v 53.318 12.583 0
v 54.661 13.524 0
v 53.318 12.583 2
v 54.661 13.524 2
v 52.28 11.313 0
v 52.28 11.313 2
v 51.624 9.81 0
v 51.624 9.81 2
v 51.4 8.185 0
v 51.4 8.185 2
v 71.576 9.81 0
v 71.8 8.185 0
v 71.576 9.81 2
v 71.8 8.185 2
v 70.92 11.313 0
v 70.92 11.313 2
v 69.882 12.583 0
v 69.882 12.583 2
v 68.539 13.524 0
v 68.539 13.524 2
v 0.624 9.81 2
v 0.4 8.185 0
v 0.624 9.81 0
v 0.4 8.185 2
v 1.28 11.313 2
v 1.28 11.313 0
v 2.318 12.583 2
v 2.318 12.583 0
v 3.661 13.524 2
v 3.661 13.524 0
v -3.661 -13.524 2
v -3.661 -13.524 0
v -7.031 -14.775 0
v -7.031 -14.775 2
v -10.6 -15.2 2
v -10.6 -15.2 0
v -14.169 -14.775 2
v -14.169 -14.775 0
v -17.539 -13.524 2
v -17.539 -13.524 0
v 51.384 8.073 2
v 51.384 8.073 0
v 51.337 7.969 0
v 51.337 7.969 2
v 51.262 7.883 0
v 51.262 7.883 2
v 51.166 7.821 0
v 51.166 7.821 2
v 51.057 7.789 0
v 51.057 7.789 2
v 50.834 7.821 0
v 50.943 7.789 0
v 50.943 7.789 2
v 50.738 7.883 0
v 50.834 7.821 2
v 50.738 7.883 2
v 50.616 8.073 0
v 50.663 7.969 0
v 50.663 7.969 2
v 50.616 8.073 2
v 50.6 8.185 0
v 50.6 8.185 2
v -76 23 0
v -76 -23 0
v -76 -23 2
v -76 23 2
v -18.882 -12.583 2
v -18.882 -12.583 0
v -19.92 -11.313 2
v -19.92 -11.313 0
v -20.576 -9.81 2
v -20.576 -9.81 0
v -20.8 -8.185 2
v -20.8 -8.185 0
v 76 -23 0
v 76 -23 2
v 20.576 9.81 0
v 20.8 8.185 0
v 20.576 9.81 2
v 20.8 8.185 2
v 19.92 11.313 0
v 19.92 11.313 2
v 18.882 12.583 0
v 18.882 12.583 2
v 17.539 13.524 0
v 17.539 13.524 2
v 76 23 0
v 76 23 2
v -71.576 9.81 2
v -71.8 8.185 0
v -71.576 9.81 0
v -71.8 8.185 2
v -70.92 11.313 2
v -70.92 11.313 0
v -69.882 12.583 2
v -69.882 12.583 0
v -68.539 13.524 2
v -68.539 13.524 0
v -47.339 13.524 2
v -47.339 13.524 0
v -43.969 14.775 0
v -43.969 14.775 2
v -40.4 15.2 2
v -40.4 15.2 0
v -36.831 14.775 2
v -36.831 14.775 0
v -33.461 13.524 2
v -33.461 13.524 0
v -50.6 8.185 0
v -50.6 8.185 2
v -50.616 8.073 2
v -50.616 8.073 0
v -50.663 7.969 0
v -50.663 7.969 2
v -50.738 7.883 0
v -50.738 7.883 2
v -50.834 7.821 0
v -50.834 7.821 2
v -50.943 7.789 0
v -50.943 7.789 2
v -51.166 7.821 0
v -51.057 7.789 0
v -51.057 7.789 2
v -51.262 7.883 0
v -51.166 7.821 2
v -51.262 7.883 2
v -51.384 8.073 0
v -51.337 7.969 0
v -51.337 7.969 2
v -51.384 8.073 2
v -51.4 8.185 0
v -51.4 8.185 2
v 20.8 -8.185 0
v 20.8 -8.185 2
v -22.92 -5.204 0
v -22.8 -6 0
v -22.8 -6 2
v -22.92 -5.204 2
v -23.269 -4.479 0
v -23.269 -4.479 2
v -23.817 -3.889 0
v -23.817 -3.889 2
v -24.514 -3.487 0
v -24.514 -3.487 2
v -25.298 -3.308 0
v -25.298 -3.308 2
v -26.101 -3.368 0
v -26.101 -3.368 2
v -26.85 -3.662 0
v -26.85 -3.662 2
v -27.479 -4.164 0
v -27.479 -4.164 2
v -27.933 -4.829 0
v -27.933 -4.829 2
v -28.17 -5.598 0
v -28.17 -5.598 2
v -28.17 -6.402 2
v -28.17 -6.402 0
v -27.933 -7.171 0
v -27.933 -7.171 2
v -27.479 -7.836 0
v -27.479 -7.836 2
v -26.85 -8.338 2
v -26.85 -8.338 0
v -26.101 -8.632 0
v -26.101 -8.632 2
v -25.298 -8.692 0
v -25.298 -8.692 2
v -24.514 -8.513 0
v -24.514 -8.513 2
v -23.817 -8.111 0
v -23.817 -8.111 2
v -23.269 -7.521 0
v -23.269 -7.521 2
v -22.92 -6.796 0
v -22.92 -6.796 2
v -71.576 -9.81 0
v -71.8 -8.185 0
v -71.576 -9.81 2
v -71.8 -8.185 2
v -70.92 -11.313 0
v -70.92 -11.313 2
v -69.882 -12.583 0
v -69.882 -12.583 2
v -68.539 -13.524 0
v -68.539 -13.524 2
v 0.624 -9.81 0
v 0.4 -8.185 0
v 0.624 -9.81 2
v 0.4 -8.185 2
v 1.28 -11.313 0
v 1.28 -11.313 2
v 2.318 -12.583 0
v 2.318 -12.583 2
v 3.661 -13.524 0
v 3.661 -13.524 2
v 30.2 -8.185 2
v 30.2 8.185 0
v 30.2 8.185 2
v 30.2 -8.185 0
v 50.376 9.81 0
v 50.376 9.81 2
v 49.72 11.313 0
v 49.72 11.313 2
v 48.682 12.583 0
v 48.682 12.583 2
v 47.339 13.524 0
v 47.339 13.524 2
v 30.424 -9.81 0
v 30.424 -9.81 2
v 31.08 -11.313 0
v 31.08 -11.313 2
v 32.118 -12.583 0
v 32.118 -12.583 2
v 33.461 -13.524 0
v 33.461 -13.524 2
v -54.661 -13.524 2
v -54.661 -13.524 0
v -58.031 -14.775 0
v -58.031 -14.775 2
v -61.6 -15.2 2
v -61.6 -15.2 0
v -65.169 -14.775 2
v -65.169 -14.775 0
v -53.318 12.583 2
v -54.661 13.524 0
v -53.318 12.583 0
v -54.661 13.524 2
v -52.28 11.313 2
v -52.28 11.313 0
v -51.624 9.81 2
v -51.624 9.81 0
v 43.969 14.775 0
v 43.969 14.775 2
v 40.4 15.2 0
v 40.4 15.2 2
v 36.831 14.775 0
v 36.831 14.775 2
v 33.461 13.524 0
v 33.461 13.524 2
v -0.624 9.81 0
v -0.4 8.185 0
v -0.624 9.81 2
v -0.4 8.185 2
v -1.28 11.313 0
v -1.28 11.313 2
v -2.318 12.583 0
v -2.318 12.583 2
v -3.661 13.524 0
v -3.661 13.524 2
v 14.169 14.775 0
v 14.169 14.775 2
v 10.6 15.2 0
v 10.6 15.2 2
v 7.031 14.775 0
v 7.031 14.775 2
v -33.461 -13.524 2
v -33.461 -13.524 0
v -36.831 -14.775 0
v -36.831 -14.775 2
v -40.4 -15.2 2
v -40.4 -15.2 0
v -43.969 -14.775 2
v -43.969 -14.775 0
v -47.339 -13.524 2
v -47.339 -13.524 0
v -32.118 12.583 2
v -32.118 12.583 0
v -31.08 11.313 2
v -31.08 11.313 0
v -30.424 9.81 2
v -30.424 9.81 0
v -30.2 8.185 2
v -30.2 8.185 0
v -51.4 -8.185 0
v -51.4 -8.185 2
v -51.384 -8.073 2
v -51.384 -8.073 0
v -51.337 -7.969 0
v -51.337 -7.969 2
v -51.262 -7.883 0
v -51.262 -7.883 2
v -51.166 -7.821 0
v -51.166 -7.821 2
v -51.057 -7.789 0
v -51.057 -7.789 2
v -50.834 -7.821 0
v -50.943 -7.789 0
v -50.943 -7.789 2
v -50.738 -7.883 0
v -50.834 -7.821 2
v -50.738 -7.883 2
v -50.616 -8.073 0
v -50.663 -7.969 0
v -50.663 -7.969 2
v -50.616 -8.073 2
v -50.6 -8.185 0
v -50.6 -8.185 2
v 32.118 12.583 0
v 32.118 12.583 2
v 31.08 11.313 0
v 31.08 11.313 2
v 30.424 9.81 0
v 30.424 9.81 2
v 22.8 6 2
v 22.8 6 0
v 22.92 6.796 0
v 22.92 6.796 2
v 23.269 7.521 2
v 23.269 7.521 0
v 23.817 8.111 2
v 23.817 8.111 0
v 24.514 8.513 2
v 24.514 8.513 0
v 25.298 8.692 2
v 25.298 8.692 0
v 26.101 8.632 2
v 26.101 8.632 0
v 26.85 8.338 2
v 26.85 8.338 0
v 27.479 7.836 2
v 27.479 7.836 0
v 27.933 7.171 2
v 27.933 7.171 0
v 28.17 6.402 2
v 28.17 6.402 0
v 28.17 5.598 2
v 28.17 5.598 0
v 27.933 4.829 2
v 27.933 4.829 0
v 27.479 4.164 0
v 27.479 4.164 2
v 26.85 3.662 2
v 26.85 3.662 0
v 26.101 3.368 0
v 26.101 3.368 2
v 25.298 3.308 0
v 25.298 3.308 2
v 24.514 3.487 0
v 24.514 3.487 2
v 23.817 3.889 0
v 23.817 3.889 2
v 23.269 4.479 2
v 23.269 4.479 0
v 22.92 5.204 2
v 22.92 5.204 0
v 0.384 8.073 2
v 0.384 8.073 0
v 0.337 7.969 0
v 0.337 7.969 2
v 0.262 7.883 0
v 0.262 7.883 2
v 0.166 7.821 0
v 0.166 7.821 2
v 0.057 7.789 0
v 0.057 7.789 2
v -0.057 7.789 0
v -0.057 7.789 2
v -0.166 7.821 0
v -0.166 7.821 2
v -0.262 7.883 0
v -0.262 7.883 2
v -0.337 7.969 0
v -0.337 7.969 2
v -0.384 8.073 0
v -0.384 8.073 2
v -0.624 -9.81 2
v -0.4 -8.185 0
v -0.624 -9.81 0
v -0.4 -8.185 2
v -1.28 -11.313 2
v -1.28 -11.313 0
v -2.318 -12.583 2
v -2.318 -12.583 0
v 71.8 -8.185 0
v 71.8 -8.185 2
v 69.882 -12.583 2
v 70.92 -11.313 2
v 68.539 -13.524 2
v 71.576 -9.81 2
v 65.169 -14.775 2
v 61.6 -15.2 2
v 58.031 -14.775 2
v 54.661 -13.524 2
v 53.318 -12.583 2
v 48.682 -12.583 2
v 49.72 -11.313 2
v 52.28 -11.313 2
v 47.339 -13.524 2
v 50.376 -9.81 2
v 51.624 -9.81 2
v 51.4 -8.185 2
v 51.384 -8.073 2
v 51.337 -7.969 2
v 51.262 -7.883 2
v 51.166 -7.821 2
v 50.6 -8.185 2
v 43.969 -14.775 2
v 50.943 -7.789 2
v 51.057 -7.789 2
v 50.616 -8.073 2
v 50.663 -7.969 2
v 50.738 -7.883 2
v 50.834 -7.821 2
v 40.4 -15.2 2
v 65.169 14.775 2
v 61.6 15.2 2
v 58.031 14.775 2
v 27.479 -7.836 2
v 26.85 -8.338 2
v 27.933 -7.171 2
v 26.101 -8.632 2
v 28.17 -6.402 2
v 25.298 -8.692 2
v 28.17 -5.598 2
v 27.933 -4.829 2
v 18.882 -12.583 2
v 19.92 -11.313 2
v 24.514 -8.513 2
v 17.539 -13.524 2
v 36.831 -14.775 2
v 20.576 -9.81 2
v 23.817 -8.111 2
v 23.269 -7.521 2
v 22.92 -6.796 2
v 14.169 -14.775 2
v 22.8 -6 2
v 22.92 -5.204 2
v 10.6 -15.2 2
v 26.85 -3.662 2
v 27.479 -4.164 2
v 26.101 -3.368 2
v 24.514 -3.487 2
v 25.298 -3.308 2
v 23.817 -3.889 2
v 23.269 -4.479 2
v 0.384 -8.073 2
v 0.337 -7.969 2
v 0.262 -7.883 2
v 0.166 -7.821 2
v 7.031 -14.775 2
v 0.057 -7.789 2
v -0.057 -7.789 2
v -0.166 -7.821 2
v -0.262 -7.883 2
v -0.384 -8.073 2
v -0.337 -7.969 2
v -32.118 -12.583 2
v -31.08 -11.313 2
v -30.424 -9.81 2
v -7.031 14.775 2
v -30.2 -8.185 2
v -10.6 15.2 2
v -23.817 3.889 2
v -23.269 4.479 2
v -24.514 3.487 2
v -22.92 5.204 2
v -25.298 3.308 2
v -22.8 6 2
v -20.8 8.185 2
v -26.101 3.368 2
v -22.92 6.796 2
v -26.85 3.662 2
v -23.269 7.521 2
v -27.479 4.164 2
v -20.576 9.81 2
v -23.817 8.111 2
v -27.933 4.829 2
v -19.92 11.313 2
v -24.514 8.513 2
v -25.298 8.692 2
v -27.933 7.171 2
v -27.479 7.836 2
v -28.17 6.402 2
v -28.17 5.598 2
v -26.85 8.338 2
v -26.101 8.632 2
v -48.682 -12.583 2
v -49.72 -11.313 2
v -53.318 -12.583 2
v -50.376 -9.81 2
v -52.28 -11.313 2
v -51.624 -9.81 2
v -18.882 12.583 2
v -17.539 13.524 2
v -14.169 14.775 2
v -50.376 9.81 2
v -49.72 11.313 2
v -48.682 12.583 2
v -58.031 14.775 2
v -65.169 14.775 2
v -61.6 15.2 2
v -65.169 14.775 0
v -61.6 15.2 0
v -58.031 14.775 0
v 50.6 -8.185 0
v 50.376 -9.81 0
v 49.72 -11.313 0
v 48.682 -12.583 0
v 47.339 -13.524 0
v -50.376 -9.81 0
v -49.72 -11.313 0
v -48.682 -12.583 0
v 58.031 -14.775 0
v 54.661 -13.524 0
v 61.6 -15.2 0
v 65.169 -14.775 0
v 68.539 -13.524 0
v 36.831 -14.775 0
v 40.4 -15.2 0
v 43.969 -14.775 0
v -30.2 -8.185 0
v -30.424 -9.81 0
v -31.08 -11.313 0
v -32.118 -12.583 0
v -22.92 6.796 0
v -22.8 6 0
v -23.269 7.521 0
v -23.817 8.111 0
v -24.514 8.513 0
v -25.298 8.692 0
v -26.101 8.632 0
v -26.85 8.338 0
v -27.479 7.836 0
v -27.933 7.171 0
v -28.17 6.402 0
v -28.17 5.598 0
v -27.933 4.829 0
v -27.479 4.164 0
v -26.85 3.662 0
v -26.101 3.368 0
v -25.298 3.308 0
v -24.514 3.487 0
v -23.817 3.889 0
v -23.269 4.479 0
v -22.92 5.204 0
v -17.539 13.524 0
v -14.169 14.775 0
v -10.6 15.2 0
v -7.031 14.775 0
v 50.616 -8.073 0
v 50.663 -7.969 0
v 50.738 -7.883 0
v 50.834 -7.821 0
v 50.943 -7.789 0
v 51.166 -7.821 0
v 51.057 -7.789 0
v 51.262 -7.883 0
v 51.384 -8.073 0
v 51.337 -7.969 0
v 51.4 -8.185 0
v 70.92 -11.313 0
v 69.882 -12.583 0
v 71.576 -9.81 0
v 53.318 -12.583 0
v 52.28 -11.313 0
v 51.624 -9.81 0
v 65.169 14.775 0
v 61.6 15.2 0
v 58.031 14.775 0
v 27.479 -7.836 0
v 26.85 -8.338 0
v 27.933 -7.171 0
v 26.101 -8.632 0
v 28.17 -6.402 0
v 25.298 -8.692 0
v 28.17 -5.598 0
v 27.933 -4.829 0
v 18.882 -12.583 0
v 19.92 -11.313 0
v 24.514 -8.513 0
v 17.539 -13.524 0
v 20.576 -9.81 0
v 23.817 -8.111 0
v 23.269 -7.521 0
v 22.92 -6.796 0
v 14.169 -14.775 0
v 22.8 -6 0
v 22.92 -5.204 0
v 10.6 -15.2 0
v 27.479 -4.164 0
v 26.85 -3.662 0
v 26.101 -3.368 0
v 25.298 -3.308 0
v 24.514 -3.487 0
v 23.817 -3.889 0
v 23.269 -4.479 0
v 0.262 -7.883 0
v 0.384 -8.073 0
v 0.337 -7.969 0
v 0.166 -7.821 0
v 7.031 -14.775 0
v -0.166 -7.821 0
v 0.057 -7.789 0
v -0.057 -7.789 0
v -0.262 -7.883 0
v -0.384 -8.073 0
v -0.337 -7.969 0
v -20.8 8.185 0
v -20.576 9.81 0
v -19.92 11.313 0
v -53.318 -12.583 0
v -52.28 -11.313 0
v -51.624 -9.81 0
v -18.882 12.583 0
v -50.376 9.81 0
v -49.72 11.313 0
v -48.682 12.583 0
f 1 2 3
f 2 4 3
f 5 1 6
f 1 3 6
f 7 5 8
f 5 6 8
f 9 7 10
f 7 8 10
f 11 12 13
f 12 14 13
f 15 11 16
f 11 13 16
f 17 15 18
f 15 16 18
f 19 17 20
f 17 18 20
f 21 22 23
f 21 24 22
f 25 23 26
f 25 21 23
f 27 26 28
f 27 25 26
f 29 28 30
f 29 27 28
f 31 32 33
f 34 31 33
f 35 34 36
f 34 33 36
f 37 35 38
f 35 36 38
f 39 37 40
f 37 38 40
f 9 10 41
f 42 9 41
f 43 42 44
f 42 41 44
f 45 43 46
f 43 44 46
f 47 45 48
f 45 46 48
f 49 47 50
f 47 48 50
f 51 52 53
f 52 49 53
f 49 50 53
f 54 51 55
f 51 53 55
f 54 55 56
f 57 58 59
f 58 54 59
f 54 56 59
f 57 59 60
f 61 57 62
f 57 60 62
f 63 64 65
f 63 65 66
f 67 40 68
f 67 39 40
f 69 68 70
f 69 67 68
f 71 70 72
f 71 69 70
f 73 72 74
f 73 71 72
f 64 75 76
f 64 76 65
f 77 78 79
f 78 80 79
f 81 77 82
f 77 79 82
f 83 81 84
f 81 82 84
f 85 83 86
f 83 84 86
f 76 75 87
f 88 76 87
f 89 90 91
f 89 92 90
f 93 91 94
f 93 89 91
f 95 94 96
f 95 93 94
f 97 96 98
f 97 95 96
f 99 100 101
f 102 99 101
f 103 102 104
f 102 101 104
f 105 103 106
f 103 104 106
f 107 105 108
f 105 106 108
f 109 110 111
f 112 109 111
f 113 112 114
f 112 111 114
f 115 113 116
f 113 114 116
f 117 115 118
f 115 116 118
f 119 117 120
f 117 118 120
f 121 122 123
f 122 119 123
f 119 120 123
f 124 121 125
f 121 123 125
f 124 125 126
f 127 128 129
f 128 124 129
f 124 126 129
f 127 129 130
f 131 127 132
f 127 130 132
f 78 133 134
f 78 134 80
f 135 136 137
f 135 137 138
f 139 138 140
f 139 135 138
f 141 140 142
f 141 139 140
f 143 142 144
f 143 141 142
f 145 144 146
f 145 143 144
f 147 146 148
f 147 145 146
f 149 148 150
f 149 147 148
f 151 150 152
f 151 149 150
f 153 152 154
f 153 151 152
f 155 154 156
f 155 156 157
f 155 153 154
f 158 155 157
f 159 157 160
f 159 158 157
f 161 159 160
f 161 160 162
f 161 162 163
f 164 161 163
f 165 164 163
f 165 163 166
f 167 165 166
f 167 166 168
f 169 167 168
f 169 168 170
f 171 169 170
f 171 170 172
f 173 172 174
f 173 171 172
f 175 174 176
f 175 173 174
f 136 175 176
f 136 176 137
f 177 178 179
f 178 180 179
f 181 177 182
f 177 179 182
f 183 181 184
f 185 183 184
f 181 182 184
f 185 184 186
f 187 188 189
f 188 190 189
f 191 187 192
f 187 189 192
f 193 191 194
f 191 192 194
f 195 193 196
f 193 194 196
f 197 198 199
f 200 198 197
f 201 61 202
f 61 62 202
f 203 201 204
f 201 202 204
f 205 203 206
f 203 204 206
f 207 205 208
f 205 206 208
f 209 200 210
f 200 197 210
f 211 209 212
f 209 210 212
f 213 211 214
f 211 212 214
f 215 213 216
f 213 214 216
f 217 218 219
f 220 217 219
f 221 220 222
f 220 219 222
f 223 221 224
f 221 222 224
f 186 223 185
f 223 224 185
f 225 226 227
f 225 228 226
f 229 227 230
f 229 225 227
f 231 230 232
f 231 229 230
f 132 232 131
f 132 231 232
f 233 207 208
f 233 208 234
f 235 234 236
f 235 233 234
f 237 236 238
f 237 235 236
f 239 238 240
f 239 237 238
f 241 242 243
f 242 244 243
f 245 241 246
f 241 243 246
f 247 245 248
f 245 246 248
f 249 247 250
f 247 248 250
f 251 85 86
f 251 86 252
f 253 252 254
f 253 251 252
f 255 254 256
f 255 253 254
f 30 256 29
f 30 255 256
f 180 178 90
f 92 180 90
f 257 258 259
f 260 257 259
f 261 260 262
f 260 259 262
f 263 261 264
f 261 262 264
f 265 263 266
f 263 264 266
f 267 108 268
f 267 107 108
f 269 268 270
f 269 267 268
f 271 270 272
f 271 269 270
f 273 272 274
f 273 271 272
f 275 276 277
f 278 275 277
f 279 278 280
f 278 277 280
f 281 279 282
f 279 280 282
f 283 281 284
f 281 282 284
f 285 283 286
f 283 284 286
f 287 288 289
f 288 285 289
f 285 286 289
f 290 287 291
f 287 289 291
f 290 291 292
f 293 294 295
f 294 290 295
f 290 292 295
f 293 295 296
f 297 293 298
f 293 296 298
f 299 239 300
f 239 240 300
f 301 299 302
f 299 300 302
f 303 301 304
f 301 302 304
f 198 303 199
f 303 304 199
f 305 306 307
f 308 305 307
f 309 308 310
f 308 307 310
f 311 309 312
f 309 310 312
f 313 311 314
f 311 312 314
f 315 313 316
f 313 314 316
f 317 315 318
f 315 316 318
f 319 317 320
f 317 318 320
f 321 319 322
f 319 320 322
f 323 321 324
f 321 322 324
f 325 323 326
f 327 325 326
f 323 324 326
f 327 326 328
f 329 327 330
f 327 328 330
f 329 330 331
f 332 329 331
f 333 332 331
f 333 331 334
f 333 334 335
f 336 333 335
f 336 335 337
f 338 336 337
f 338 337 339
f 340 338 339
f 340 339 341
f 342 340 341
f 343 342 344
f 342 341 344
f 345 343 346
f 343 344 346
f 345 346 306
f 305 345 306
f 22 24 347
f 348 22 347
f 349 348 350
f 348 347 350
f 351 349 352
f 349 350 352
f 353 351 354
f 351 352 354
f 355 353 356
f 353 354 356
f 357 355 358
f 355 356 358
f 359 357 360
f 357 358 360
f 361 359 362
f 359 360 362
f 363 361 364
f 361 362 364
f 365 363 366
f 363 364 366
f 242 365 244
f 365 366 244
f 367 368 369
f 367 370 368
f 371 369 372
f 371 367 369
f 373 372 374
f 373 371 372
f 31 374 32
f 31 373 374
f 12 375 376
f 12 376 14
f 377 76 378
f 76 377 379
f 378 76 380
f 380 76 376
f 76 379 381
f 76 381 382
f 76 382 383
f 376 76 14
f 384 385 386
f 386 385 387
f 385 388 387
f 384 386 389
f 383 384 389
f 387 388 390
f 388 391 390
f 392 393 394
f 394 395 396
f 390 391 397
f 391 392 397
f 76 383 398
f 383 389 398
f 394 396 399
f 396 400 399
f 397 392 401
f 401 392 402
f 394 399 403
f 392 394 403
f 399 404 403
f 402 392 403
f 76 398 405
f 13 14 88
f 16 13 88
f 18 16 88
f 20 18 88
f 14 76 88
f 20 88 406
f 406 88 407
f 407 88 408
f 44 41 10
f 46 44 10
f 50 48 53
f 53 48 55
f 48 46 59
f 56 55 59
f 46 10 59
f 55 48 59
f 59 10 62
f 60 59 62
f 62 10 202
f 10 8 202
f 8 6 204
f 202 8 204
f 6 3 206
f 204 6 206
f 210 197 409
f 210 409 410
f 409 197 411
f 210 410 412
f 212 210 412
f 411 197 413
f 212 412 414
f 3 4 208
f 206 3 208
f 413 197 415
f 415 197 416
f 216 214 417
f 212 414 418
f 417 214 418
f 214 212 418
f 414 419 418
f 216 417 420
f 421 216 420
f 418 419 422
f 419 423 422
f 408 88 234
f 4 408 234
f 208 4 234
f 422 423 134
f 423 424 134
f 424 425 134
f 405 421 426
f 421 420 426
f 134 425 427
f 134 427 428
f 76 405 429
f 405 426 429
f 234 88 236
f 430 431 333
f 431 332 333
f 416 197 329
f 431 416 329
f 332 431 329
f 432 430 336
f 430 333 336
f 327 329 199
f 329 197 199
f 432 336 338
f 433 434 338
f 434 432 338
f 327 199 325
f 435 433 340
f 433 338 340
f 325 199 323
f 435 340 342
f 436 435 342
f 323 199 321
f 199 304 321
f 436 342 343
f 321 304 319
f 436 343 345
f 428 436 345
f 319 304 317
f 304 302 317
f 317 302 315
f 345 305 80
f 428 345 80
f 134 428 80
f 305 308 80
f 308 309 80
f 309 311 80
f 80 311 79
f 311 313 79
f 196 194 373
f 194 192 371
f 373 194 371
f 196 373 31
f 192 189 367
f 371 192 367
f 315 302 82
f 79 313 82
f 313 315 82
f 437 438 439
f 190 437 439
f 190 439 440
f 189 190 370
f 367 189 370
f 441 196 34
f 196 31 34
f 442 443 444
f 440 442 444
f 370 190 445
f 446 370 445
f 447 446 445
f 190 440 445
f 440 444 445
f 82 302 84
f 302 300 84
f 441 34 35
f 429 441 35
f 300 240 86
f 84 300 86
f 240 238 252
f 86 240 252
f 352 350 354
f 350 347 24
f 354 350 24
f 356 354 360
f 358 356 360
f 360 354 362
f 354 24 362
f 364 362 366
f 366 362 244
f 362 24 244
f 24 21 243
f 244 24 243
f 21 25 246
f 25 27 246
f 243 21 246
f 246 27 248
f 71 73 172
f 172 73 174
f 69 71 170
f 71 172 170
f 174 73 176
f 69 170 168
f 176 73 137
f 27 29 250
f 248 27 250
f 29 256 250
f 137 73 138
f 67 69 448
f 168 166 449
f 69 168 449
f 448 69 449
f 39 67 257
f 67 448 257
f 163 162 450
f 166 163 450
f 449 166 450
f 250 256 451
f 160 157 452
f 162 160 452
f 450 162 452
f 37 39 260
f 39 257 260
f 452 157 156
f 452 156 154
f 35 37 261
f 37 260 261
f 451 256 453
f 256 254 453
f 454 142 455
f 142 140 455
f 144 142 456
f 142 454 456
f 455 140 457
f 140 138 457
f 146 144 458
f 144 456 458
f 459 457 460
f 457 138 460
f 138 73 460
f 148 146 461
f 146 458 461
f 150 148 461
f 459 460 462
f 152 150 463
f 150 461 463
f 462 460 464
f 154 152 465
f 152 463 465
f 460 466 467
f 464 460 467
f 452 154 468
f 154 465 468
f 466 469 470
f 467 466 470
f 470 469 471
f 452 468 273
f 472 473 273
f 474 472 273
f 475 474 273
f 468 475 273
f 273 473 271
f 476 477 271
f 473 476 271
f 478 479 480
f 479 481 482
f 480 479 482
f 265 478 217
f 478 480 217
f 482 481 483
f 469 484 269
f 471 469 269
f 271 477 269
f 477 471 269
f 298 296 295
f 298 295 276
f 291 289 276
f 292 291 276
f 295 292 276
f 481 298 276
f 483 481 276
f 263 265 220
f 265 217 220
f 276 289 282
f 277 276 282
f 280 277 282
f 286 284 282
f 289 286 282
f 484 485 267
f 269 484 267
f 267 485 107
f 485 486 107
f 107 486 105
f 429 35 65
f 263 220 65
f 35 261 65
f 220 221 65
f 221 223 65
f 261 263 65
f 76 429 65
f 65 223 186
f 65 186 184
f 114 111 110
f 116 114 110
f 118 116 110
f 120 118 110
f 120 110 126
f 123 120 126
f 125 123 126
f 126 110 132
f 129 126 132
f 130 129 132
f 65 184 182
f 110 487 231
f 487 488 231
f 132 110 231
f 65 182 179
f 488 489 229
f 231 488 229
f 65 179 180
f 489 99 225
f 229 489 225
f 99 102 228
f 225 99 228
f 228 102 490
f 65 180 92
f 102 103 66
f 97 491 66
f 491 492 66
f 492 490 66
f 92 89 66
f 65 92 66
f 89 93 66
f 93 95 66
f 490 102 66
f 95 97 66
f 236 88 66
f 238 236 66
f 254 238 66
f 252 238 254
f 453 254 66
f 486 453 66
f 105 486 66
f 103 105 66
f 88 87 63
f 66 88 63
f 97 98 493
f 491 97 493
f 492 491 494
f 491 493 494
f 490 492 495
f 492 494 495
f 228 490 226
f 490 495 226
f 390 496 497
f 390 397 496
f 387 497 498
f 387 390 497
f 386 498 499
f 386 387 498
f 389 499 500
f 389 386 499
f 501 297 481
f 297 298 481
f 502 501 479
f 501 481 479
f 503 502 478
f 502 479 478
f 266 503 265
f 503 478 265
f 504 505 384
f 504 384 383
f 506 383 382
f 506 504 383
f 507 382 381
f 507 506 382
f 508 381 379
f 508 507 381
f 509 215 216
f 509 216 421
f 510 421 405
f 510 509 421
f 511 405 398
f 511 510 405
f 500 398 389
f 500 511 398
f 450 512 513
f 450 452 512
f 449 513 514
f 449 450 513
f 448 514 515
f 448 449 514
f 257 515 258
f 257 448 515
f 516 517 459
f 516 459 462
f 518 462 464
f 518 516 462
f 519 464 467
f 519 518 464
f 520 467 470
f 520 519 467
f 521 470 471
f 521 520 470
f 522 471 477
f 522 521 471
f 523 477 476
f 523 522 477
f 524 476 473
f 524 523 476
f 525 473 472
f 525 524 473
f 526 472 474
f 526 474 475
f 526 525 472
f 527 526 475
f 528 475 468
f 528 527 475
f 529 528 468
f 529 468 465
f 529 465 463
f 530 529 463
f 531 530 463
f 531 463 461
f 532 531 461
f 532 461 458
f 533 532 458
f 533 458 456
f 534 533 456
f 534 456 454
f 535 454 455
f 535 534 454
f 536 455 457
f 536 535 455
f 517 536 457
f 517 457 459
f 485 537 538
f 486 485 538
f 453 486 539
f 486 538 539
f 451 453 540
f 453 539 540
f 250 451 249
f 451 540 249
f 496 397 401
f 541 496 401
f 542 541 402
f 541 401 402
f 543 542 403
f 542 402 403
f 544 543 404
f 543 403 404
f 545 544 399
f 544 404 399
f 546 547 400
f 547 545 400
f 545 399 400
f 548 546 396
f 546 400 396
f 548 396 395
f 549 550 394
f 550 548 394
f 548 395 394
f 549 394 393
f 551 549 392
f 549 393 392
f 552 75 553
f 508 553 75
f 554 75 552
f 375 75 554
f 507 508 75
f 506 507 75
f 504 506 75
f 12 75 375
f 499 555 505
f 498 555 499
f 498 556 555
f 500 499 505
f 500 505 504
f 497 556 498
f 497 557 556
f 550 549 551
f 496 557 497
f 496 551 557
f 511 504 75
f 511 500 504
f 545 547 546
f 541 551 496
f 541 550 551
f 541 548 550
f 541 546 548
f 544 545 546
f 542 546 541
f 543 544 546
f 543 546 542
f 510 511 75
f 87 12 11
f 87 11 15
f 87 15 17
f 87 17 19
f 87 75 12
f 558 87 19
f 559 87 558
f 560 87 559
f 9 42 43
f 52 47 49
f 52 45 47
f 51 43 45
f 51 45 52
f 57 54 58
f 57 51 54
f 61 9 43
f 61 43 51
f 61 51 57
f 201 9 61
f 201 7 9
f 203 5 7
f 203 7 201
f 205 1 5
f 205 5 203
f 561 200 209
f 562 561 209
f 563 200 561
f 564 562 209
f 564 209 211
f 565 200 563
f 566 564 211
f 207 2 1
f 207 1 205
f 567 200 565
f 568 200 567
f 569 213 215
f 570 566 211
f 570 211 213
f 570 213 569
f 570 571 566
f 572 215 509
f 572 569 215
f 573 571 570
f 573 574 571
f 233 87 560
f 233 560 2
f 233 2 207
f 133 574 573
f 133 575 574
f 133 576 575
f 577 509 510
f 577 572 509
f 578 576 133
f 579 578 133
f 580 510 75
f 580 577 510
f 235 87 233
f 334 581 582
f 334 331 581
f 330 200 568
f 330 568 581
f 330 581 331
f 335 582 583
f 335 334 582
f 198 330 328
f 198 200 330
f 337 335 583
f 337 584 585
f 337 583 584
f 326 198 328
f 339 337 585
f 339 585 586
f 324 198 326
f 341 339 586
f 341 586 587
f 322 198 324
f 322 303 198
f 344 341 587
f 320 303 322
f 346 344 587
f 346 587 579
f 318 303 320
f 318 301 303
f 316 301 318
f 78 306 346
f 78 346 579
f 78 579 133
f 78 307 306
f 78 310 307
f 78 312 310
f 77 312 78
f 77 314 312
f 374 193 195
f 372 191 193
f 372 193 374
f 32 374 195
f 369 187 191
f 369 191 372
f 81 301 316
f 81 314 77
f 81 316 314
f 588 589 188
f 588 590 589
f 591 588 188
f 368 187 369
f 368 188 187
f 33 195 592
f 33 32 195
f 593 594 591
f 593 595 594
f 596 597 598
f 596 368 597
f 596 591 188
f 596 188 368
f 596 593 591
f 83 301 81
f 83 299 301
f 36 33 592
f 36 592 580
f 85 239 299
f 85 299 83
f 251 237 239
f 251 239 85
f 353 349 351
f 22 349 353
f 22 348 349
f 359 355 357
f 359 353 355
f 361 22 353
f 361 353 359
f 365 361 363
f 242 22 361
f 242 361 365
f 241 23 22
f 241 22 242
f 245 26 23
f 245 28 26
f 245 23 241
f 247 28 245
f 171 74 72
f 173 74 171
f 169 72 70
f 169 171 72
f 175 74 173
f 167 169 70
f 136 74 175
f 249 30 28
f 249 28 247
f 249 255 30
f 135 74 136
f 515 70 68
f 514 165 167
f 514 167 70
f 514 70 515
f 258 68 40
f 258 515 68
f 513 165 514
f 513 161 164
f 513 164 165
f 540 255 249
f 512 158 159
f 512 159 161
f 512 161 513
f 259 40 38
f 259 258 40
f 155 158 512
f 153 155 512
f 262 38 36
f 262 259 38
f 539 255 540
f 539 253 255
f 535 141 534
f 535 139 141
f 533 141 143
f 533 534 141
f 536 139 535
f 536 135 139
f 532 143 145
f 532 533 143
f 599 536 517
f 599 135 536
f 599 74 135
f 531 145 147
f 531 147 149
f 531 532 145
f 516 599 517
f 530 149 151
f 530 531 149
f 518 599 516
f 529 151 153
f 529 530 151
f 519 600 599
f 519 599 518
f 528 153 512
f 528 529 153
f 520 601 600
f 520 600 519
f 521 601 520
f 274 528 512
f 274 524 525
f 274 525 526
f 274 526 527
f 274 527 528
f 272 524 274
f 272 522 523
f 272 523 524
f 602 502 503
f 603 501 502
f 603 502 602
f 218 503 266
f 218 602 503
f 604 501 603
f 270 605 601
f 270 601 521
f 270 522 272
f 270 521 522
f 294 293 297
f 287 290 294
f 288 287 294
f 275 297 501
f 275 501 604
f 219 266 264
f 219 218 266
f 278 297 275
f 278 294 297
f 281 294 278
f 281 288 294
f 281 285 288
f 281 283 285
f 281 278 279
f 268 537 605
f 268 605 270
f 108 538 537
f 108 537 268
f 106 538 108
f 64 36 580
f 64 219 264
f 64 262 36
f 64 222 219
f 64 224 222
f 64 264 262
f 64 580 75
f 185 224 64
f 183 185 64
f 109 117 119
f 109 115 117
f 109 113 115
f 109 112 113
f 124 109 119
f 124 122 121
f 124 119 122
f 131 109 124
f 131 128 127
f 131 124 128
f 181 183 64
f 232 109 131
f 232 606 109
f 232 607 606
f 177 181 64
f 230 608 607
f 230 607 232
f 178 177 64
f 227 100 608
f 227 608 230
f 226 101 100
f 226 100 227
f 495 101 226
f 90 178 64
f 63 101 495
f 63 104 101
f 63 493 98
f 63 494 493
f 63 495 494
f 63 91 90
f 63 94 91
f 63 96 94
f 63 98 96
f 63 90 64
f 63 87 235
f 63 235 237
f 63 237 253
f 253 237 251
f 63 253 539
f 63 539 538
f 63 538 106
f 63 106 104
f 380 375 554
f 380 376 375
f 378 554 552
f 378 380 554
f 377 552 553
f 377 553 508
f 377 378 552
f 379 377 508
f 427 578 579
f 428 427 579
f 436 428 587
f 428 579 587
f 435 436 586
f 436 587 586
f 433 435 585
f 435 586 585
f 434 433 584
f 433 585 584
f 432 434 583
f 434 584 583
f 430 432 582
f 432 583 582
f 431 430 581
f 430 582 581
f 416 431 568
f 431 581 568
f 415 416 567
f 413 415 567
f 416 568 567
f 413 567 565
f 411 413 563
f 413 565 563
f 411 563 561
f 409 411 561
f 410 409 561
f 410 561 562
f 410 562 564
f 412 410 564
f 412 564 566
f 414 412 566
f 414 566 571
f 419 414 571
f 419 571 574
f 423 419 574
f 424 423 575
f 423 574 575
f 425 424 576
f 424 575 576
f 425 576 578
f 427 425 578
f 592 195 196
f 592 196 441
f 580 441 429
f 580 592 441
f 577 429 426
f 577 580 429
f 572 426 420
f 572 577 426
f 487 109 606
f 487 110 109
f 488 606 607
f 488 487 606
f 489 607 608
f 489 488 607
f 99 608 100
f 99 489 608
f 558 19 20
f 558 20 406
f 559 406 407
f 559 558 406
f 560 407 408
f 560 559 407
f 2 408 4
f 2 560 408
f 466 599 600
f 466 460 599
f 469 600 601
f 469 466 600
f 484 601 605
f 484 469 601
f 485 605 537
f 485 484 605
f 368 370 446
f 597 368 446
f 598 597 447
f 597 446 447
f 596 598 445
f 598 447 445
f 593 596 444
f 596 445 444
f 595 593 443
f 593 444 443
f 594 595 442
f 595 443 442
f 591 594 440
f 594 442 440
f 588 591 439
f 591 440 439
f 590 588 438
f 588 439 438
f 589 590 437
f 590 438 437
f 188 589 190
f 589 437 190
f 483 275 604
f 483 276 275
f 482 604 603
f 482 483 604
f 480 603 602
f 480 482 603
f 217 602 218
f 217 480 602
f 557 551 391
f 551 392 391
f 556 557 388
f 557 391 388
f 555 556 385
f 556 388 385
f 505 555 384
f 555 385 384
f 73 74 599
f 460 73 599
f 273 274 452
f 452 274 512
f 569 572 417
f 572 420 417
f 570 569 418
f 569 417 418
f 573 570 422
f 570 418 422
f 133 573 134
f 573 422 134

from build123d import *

# Parameters (mm, degrees)
F0_W     = 76
F0_H     = 46
F0_R     = 2.7
F1_DEPTH = 2
F2_R     = 6
F5_DEPTH = 25


with BuildPart() as f1:
    # F0 (on Top) → F1 (new body)
    with BuildSketch(Plane.XY):
        with Locations((-38, 0)):
            Rectangle(F0_W, F0_H)
        Polygon((-71.8, 11.2694276696), (-71.8, 15.2), (-61.6, 15.2), (-51.4, 15.2), (-51.4, 11.2694276696), (-51.4, -11.2694276696), (-51.4, -15.2), (-61.6, -15.2), (-71.8, -15.2), (-71.8, -11.2694276696), align=None, mode=Mode.SUBTRACT)
        Polygon((-50.6, 11.2694276696), (-50.6, 15.2), (-40.4, 15.2), (-30.2, 15.2), (-30.2, 11.2694276696), (-30.2, -11.2694276696), (-30.2, -15.2), (-40.4, -15.2), (-50.6, -15.2), (-50.6, -11.2694276696), align=None, mode=Mode.SUBTRACT)
        with Locations((-25.5, -6)):
            Circle(F0_R, mode=Mode.SUBTRACT)
        Polygon((-10.6, 15.2), (-0.4, 15.2), (-0.4, 11.2694276696), (-0.4, -11.2694276696), (-0.4, -15.2), (-10.6, -15.2), (-20.8, -15.2), (-20.8, -11.2694276696), (-20.8, 11.2694276696), (-20.8, 15.2), align=None, mode=Mode.SUBTRACT)
        with Locations((-25.5, 6)):
            Circle(F0_R, mode=Mode.SUBTRACT)
        with BuildLine():
            Line((-61.6, 15.2), (-71.8, 15.2))
            Line((-71.8, 15.2), (-71.8, 11.2694276696))
            ThreePointArc((-71.8, 11.2694276696), (-67.0655603291, 14.1833582162), (-61.6, 15.2))
        make_face()
        with BuildLine():
            Line((-51.4, 15.2), (-61.6, 15.2))
            ThreePointArc((-61.6, 15.2), (-56.1344396709, 14.1833582162), (-51.4, 11.2694276696))
            Line((-51.4, 11.2694276696), (-51.4, 15.2))
        make_face()
        with BuildLine():
            Line((-51.4, -15.2), (-51.4, -11.2694276696))
            ThreePointArc((-51.4, -11.2694276696), (-56.1344396709, -14.1833582162), (-61.6, -15.2))
            Line((-61.6, -15.2), (-51.4, -15.2))
        make_face()
        with BuildLine():
            ThreePointArc((-61.6, -15.2), (-67.0655603291, -14.1833582162), (-71.8, -11.2694276696))
            Line((-71.8, -11.2694276696), (-71.8, -15.2))
            Line((-71.8, -15.2), (-61.6, -15.2))
        make_face()
        with BuildLine():
            Line((-40.4, 15.2), (-50.6, 15.2))
            Line((-50.6, 15.2), (-50.6, 11.2694276696))
            ThreePointArc((-50.6, 11.2694276696), (-45.8655603291, 14.1833582162), (-40.4, 15.2))
        make_face()
        with BuildLine():
            Line((-30.2, 15.2), (-40.4, 15.2))
            ThreePointArc((-40.4, 15.2), (-34.9344396709, 14.1833582162), (-30.2, 11.2694276696))
            Line((-30.2, 11.2694276696), (-30.2, 15.2))
        make_face()
        with BuildLine():
            ThreePointArc((-20.8, 11.2694276696), (-16.0655603291, 14.1833582162), (-10.6, 15.2))
            Line((-10.6, 15.2), (-20.8, 15.2))
            Line((-20.8, 15.2), (-20.8, 11.2694276696))
        make_face()
        with BuildLine():
            Line((-0.4, 11.2694276696), (-0.4, 15.2))
            Line((-0.4, 15.2), (-10.6, 15.2))
            ThreePointArc((-10.6, 15.2), (-5.1344396709, 14.1833582162), (-0.4, 11.2694276696))
        make_face()
        with BuildLine():
            Line((-0.4, -15.2), (-0.4, -11.2694276696))
            ThreePointArc((-0.4, -11.2694276696), (-5.1344396709, -14.1833582162), (-10.6, -15.2))
            Line((-10.6, -15.2), (-0.4, -15.2))
        make_face()
        with BuildLine():
            ThreePointArc((-10.6, -15.2), (-16.0655603291, -14.1833582162), (-20.8, -11.2694276696))
            Line((-20.8, -11.2694276696), (-20.8, -15.2))
            Line((-20.8, -15.2), (-10.6, -15.2))
        make_face()
        with BuildLine():
            Line((-30.2, -15.2), (-30.2, -11.2694276696))
            ThreePointArc((-30.2, -11.2694276696), (-34.9344396709, -14.1833582162), (-40.4, -15.2))
            Line((-40.4, -15.2), (-30.2, -15.2))
        make_face()
        with BuildLine():
            ThreePointArc((-40.4, -15.2), (-45.8655603291, -14.1833582162), (-50.6, -11.2694276696))
            Line((-50.6, -11.2694276696), (-50.6, -15.2))
            Line((-50.6, -15.2), (-40.4, -15.2))
        make_face()
    extrude(amount=F1_DEPTH)

    # F2
    f2_edges = [f1.edges().sort_by_distance(p)[0] for p in [
        (-71.8, 11.269428, 1),
        (-71.8, -11.269428, 1),
        (-51.4, -11.269428, 1),
        (-51.4, 11.269428, 1),
        (-50.6, 11.269428, 1),
        (-50.6, -11.269428, 1),
        (-20.8, 11.269428, 1),
        (-20.8, -11.269428, 1),
        (-0.4, 11.269428, 1),
        (-0.4, -11.269428, 1),
        (-30.2, -11.269428, 1),
        (-30.2, 11.269428, 1),
    ]]
    fillet(f2_edges, radius=F2_R)

    # F3: F1 across face


with BuildPart() as f1_1:
    add(f1.part)
    add(f1.part.mirror(Plane(origin=(0, 0, 1), x_dir=(0, 1, 0), z_dir=(1, 0, 0))))

    # F4 (on face) → F5 (cut)
    with BuildSketch(Plane.XY.offset(2)):
        with BuildLine():
            ThreePointArc((0.4, 8.1853527719), (0, 7.7853527719), (-0.4, 8.1853527719))
            Line((-0.4, 8.1853527719), (-0.4, -8.1853527719))
            ThreePointArc((-0.4, -8.1853527719), (0, -7.7853527719), (0.4, -8.1853527719))
            Line((0.4, -8.1853527719), (0.4, 8.1853527719))
        make_face()
        with BuildLine():
            ThreePointArc((51.4, 8.1853527719), (51, 7.7853527719), (50.6, 8.1853527719))
            Line((50.6, 8.1853527719), (50.6, -8.1853527719))
            ThreePointArc((50.6, -8.1853527719), (51, -7.7853527719), (51.4, -8.1853527719))
            Line((51.4, -8.1853527719), (51.4, 8.1853527719))
        make_face()
        with BuildLine():
            ThreePointArc((-50.6, 8.1853527719), (-51, 7.7853527719), (-51.4, 8.1853527719))
            Line((-51.4, 8.1853527719), (-51.4, -8.1853527719))
            ThreePointArc((-51.4, -8.1853527719), (-51, -7.7853527719), (-50.6, -8.1853527719))
            Line((-50.6, -8.1853527719), (-50.6, 8.1853527719))
        make_face()
    extrude(amount=-F5_DEPTH, mode=Mode.SUBTRACT)


solid = f1_1.part
